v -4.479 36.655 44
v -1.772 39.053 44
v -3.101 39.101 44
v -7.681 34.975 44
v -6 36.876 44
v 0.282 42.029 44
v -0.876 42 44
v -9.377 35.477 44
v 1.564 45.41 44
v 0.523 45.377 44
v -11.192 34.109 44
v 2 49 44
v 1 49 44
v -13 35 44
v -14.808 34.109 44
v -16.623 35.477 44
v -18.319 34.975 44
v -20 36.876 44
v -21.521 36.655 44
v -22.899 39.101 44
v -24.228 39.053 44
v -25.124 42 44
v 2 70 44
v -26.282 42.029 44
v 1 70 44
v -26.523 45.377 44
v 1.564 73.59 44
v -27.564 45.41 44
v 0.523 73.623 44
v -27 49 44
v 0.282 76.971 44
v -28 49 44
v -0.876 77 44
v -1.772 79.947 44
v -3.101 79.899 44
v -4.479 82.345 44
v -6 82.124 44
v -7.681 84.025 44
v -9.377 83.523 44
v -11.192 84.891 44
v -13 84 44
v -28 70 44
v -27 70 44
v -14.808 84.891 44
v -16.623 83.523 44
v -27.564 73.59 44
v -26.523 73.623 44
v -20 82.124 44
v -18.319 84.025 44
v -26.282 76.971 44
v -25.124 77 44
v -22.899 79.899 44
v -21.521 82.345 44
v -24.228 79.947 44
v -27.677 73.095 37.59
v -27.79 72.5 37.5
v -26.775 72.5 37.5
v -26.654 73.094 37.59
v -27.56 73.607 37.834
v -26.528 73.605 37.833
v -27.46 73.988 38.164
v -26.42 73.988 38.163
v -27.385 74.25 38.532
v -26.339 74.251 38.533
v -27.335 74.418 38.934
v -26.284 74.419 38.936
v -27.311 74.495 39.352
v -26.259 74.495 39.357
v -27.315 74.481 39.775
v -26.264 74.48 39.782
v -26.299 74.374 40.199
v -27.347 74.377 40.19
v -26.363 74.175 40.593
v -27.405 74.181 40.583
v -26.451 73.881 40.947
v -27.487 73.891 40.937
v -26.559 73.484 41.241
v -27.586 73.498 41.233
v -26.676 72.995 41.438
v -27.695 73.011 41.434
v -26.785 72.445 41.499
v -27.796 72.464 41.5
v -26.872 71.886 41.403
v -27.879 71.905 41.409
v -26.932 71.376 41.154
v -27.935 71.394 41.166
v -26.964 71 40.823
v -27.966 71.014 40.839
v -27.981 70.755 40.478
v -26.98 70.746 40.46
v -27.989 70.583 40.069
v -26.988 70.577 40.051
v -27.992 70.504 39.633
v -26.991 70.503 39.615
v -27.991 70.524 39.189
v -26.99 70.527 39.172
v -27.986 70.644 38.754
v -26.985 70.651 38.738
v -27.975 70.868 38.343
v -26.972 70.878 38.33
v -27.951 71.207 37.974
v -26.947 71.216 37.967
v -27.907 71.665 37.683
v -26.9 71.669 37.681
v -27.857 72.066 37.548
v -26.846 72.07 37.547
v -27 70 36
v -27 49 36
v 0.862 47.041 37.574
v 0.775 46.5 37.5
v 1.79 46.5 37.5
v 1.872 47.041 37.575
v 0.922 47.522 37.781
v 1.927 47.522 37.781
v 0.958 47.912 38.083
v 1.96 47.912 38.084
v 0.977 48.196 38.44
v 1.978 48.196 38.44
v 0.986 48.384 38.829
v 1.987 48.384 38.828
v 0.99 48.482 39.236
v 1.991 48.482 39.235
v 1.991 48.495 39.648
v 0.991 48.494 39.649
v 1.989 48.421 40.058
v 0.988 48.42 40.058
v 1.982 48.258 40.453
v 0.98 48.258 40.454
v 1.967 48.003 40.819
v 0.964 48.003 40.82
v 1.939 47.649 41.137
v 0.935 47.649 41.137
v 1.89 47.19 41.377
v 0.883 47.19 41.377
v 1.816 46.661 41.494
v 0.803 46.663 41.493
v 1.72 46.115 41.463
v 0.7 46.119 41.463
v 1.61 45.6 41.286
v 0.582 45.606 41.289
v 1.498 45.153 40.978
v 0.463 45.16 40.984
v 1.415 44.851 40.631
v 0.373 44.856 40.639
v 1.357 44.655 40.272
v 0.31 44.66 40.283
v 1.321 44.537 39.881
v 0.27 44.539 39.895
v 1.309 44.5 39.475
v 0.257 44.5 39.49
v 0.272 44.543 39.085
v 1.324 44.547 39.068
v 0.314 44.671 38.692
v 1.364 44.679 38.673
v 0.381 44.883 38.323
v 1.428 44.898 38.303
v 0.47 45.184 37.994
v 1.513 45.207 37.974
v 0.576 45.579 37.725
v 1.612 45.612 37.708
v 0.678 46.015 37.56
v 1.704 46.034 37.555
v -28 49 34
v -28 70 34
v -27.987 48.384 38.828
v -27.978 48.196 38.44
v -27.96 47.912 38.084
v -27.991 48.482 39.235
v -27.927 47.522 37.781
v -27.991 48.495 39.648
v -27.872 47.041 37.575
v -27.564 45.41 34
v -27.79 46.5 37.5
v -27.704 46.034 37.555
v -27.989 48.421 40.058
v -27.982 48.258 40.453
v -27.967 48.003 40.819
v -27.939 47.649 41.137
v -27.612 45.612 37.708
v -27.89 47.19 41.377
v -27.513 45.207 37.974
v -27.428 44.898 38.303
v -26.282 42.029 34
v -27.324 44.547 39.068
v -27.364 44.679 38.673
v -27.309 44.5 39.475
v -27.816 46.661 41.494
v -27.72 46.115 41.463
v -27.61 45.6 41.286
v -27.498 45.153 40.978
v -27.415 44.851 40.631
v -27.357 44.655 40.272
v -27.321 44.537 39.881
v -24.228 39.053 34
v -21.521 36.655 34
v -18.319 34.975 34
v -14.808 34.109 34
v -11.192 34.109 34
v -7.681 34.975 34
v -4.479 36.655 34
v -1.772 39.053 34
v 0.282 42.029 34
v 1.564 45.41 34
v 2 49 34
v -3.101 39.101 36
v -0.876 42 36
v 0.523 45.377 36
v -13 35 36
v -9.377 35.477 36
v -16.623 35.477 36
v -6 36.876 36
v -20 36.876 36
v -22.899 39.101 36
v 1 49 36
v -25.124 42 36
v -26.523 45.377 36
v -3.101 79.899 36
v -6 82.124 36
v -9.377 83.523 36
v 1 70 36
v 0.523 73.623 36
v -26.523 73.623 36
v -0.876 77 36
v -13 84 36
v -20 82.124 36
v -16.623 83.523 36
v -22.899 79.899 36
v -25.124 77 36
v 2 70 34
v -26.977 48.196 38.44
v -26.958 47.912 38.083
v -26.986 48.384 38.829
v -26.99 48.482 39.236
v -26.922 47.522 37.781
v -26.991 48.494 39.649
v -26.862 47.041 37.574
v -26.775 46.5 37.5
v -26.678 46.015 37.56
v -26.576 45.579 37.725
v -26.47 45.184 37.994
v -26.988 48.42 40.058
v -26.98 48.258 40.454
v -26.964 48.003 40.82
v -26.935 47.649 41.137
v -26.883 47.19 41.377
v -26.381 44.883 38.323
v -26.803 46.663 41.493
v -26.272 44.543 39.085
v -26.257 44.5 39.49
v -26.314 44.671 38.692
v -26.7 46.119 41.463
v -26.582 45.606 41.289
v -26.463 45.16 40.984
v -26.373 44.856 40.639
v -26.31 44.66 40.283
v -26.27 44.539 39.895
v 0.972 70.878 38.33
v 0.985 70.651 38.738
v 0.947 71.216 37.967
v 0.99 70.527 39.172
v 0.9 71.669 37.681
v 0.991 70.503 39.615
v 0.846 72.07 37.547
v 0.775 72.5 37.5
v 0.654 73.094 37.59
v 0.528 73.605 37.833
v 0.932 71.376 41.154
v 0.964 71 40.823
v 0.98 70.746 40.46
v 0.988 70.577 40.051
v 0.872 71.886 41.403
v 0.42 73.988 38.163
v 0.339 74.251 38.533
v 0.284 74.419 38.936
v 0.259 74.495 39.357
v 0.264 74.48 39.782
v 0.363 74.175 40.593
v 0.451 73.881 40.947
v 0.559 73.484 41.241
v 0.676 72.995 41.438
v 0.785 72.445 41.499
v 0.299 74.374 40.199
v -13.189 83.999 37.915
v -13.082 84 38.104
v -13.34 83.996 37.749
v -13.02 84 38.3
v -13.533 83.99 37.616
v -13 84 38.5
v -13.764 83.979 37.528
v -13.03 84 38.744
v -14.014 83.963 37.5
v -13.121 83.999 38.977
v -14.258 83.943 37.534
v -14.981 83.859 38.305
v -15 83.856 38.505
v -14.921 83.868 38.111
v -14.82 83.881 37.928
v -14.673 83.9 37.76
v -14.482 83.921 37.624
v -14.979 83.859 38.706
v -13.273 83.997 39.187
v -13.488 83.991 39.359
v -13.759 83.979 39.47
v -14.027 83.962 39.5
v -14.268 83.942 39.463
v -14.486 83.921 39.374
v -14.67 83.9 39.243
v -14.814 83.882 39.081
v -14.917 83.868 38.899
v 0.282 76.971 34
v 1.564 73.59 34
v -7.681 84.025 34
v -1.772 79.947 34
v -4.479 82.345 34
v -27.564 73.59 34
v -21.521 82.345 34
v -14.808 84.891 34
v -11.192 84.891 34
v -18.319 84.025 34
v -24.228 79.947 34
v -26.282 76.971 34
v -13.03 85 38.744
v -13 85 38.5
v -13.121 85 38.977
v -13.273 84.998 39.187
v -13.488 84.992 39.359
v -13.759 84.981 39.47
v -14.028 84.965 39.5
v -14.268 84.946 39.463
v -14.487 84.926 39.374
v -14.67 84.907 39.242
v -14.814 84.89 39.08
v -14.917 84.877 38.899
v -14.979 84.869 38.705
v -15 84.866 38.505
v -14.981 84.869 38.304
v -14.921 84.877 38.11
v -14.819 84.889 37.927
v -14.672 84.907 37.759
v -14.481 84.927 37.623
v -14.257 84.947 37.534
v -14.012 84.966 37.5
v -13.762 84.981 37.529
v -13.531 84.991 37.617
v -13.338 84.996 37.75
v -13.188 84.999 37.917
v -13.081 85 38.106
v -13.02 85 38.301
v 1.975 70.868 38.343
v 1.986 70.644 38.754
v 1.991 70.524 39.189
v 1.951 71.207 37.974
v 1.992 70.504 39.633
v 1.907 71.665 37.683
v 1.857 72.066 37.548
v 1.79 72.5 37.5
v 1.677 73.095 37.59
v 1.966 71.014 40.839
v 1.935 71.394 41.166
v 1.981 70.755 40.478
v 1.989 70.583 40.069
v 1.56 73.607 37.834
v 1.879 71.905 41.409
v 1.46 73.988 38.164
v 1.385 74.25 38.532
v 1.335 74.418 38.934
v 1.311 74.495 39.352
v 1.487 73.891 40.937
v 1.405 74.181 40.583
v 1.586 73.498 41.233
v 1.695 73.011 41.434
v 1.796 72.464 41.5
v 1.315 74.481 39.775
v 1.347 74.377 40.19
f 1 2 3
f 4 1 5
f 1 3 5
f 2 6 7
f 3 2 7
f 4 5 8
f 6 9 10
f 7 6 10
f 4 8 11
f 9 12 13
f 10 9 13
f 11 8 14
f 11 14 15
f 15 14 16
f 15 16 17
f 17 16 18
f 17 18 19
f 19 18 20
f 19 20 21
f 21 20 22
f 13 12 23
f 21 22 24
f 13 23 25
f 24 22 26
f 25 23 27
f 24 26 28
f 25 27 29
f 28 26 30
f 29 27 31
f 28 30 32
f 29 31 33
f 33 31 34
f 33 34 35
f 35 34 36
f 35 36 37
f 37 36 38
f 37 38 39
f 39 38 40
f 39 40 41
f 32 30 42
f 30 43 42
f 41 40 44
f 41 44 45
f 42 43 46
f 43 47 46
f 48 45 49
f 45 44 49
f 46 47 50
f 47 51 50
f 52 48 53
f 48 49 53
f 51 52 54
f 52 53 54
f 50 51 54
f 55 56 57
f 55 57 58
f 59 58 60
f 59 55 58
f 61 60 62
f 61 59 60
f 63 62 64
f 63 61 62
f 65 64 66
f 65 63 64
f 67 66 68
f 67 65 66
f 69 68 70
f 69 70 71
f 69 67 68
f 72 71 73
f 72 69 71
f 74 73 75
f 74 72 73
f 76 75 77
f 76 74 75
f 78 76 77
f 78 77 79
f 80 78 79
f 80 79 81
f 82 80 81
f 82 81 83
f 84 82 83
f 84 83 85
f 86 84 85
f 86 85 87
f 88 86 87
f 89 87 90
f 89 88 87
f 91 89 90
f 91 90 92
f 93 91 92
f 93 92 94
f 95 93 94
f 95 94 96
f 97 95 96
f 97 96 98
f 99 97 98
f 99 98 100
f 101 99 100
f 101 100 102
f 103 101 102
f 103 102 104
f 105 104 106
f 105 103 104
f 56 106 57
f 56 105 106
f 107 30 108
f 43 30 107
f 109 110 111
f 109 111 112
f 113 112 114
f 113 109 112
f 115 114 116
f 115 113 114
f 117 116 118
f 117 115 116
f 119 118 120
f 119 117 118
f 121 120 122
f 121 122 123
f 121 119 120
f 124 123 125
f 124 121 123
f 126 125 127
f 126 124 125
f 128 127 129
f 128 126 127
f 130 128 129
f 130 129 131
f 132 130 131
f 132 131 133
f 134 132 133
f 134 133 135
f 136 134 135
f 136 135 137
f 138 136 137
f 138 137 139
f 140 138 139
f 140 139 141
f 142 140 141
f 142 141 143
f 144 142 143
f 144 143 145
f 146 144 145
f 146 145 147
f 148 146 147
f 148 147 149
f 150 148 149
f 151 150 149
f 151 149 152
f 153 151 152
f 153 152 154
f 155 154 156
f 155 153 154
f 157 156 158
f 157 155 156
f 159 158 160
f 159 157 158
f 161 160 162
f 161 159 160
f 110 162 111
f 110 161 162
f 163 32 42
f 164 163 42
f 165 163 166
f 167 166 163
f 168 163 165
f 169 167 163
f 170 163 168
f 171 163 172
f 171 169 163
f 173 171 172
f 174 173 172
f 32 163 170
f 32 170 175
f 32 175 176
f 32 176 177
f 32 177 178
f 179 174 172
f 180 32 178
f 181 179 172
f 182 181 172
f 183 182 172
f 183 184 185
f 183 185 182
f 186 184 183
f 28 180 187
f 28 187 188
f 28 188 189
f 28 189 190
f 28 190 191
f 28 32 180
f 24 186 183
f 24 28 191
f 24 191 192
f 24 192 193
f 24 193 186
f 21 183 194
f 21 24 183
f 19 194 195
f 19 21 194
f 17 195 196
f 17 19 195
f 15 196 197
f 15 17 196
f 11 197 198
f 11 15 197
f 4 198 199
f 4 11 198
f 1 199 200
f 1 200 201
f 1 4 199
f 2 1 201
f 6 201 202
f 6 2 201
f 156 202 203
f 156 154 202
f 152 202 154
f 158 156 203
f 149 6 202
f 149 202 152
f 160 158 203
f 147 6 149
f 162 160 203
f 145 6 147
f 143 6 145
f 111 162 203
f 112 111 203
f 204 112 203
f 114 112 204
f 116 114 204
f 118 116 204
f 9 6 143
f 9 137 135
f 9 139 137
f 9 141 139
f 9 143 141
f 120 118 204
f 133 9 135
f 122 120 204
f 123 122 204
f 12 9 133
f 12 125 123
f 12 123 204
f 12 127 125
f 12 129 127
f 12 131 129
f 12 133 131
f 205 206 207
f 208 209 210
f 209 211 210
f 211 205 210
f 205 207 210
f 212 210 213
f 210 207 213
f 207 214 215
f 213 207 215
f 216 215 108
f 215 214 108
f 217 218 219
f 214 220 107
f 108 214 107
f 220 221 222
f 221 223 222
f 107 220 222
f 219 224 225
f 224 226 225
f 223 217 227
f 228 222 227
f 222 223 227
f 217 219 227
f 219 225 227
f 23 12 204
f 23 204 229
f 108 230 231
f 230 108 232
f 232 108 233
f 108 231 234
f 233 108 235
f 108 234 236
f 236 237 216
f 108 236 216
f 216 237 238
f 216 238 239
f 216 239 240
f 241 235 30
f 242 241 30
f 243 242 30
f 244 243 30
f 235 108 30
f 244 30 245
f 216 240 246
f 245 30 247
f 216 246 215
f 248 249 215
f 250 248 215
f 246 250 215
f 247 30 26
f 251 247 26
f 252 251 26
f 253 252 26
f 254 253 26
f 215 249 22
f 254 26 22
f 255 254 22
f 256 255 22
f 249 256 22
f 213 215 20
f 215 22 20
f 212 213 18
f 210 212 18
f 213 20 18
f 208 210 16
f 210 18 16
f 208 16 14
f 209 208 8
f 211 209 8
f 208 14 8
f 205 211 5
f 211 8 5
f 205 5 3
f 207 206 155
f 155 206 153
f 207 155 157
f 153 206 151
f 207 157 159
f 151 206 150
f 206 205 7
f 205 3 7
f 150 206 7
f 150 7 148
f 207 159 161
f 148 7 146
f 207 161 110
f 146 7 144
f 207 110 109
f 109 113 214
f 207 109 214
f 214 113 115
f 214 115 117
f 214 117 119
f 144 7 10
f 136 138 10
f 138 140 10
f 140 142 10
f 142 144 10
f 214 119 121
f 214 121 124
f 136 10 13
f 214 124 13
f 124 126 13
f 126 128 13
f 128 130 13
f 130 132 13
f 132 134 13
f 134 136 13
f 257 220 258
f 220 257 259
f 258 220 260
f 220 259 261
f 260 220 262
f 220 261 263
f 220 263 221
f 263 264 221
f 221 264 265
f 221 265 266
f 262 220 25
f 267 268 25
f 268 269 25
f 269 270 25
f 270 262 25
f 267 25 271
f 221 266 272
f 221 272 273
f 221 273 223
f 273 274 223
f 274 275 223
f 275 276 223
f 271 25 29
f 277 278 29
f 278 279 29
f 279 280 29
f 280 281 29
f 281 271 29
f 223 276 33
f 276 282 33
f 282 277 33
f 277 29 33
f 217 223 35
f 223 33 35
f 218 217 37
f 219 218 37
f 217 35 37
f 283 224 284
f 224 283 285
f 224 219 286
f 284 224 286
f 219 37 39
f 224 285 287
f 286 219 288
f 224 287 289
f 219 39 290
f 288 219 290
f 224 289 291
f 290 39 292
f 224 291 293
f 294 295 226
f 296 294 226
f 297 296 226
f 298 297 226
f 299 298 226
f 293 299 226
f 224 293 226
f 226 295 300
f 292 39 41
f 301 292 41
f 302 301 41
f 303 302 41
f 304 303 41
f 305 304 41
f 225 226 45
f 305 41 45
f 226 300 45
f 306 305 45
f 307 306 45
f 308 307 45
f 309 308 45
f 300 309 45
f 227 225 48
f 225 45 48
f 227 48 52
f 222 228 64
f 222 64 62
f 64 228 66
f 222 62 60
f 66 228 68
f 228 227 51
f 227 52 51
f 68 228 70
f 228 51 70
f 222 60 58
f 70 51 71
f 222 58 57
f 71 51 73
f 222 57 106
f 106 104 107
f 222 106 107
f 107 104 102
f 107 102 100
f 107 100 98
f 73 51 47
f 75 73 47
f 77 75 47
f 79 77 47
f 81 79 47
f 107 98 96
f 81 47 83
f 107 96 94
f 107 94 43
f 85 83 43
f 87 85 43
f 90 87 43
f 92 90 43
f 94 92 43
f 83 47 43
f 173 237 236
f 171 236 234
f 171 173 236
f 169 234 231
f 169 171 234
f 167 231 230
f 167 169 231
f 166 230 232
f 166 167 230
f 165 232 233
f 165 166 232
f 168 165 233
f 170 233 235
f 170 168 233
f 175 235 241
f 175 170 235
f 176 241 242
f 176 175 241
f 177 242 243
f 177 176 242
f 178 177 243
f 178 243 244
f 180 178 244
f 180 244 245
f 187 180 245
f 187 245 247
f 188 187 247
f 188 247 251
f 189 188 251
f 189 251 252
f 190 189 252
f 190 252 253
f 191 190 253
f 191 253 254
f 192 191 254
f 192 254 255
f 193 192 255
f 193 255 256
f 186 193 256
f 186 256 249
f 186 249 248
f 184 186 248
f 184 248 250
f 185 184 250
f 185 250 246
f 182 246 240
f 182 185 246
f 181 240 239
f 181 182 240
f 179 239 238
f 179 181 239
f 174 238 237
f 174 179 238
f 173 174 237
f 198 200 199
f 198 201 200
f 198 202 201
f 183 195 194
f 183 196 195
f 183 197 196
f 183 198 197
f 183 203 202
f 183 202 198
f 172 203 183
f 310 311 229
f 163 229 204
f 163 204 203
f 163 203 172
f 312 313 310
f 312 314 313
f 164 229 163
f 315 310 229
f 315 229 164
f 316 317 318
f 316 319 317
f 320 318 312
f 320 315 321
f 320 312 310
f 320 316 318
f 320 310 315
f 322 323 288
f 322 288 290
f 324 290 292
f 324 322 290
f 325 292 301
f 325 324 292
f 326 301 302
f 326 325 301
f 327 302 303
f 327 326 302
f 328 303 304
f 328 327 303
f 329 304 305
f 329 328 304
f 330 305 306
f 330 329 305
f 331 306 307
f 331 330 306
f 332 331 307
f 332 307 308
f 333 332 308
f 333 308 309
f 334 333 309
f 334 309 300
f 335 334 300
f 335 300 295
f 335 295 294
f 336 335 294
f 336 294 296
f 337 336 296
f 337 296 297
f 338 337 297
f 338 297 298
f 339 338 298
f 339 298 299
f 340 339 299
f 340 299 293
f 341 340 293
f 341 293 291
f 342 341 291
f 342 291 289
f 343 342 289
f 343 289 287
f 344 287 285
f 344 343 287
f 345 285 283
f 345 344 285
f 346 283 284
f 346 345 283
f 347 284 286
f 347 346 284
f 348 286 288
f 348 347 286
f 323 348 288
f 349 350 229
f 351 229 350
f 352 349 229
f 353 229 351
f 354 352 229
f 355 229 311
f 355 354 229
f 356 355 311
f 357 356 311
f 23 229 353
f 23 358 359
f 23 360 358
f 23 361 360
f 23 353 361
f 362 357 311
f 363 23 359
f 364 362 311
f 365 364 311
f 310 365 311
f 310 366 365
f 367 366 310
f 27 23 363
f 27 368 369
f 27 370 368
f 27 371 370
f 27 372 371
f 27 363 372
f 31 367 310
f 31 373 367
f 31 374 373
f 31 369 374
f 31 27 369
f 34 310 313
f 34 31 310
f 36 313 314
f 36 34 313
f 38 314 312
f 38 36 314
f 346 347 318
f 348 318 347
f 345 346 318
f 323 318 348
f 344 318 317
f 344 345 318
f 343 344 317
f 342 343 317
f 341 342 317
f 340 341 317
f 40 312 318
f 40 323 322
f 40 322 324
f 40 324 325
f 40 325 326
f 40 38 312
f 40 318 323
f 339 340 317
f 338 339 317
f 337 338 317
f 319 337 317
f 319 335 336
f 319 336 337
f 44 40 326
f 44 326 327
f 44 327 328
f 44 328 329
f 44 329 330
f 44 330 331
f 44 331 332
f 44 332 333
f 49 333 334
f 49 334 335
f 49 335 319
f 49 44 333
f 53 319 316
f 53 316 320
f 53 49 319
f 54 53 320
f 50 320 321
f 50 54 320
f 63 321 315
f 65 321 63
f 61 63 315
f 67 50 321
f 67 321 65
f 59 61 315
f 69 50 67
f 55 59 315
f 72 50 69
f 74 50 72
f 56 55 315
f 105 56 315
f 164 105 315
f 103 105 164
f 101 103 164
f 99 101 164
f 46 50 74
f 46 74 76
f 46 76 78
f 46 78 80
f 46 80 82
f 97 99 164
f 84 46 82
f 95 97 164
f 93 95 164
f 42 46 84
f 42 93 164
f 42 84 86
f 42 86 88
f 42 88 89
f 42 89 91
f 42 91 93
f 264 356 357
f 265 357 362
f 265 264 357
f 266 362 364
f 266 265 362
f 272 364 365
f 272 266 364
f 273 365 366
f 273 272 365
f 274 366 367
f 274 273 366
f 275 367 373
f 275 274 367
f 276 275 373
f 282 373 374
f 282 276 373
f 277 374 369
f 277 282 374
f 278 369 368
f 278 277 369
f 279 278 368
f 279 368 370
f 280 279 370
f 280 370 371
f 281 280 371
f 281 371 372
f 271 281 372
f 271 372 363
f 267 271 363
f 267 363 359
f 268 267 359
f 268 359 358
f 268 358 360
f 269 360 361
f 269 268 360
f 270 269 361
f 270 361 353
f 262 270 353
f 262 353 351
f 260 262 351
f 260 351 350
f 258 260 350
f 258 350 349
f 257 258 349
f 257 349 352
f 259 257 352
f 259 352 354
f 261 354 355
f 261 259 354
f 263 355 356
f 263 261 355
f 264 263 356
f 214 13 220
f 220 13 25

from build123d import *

# Parameters (mm, degrees)
CYLINDER017_R           = 1
CYLINDER017_DEPTH       = 10
CYLINDER017_ROLL_ANGLE  = 90
CYLINDER011_R           = 2
CYLINDER011_DEPTH       = 10
CYLINDER011_PITCH_ANGLE = 90
CYLINDER014_R           = 2
CYLINDER014_DEPTH       = 10
CYLINDER014_PITCH_ANGLE = 90
CYLINDER013_R           = 2
CYLINDER013_DEPTH       = 10
CYLINDER013_PITCH_ANGLE = 90
CYLINDER015_R           = 2
CYLINDER015_DEPTH       = 10
CYLINDER015_PITCH_ANGLE = 90
CYLINDER002_W           = 14
CYLINDER002_H           = 8
CYLINDER002_ANGLE       = 180
CYLINDER001_W           = 15
CYLINDER001_H           = 10
CYLINDER001_ANGLE       = 180
CYLINDER003_W           = 14
CYLINDER003_H           = 8
CYLINDER003_ANGLE       = 180
CYLINDER_W              = 15
CYLINDER_H              = 10
CYLINDER_ANGLE          = 180
BOX001_W                = 28
BOX001_H                = 21
BOX001_DEPTH            = 8
BOX_W                   = 30
BOX_H                   = 21
BOX_DEPTH               = 10
FUSION_PLACEMENT_ANGLE  = 180


with BuildPart() as cilindro017:
    # Cylinder017 → Cylinder017 (new body)
    with BuildSketch(Plane.XY):
        Circle(CYLINDER017_R)
    extrude(amount=CYLINDER017_DEPTH)


with BuildPart() as cilindro017_1:
    # Cylinder017 roll: moved
    add(cilindro017.part.rotate(Axis((0, 0, 0), (1, 0, 0)), CYLINDER017_ROLL_ANGLE))


with BuildPart() as cilindro017_2:
    # Cylinder017 placement: moved
    add(cilindro017_1.part.moved(Location((-14, 90, 38.5))))


with BuildPart() as cilindro011:
    # Cylinder011 → Cylinder011 (new body)
    with BuildSketch(Plane.XY):
        Circle(CYLINDER011_R)
    extrude(amount=CYLINDER011_DEPTH)


with BuildPart() as cilindro011_1:
    # Cylinder011 pitch: moved
    add(cilindro011.part.rotate(Axis((0, 0, 0), (0, 1, 0)), CYLINDER011_PITCH_ANGLE))


with BuildPart() as cilindro011_2:
    # Cylinder011 placement: moved
    add(cilindro011_1.part.moved(Location((-32, 72.5, 39.5))))


with BuildPart() as cilindro014:
    # Cylinder014 → Cylinder014 (new body)
    with BuildSketch(Plane.XY):
        Circle(CYLINDER014_R)
    extrude(amount=CYLINDER014_DEPTH)


with BuildPart() as cilindro014_1:
    # Cylinder014 pitch: moved
    add(cilindro014.part.rotate(Axis((0, 0, 0), (0, 1, 0)), CYLINDER014_PITCH_ANGLE))


with BuildPart() as cilindro014_2:
    # Cylinder014 placement: moved
    add(cilindro014_1.part.moved(Location((-6, 46.5, 39.5))))


with BuildPart() as cilindro013:
    # Cylinder013 → Cylinder013 (new body)
    with BuildSketch(Plane.XY):
        Circle(CYLINDER013_R)
    extrude(amount=CYLINDER013_DEPTH)


with BuildPart() as cilindro013_1:
    # Cylinder013 pitch: moved
    add(cilindro013.part.rotate(Axis((0, 0, 0), (0, 1, 0)), CYLINDER013_PITCH_ANGLE))


with BuildPart() as cilindro013_2:
    # Cylinder013 placement: moved
    add(cilindro013_1.part.moved(Location((-32, 46.5, 39.5))))


with BuildPart() as cilindro015:
    # Cylinder015 → Cylinder015 (new body)
    with BuildSketch(Plane.XY):
        Circle(CYLINDER015_R)
    extrude(amount=CYLINDER015_DEPTH)


with BuildPart() as cilindro015_1:
    # Cylinder015 pitch: moved
    add(cilindro015.part.rotate(Axis((0, 0, 0), (0, 1, 0)), CYLINDER015_PITCH_ANGLE))


with BuildPart() as cilindro015_2:
    # Cylinder015 placement: moved
    add(cilindro015_1.part.moved(Location((-5, 72.5, 39.5))))


with BuildPart() as cilindro002:
    # Cylinder002 → Cylinder002 (revolve)
    with BuildSketch(Plane(origin=(16, 49, -36), x_dir=(1, 0, 0), z_dir=(0, 1, 0))):
        with Locations((7, 4)):
            Rectangle(CYLINDER002_W, CYLINDER002_H)
    revolve(axis=Axis((16, 49, -36), (0, 0, -1)), revolution_arc=CYLINDER002_ANGLE)


with BuildPart() as cut001:
    # Cylinder001 → Cylinder001 (revolve)
    with BuildSketch(Plane(origin=(16, 49, -34), x_dir=(1, 0, 0), z_dir=(0, 1, 0))):
        with Locations((7.5, 5)):
            Rectangle(CYLINDER001_W, CYLINDER001_H)
    revolve(axis=Axis((16, 49, -34), (0, 0, -1)), revolution_arc=CYLINDER001_ANGLE)

    # Cut001: cut Cilindro002
    add(cilindro002.part, mode=Mode.SUBTRACT)


with BuildPart() as cut001_1:
    # Cut001 placement: moved
    add(cut001.part.moved(Location((-3, 0, 0))))


with BuildPart() as cilindro003:
    # Cylinder003 → Cylinder003 (revolve)
    with BuildSketch(Plane(origin=(13, 70, -36), x_dir=(-1, 0, 0), z_dir=(0, -1, 0))):
        with Locations((7, 4)):
            Rectangle(CYLINDER003_W, CYLINDER003_H)
    revolve(axis=Axis((13, 70, -36), (0, 0, -1)), revolution_arc=CYLINDER003_ANGLE)


with BuildPart() as cut002:
    # Cylinder → Cylinder (revolve)
    with BuildSketch(Plane(origin=(13, 70, -34), x_dir=(-1, 0, 0), z_dir=(0, -1, 0))):
        with Locations((7.5, 5)):
            Rectangle(CYLINDER_W, CYLINDER_H)
    revolve(axis=Axis((13, 70, -34), (0, 0, -1)), revolution_arc=CYLINDER_ANGLE)

    # Cut002: cut Cilindro003
    add(cilindro003.part, mode=Mode.SUBTRACT)


with BuildPart() as cubo001:
    # Box001 → Box001 (new body)
    with BuildSketch(Plane(origin=(-1, 49, -44), x_dir=(1, 0, 0), z_dir=(0, 0, 1))):
        with Locations((14, 10.5)):
            Rectangle(BOX001_W, BOX001_H)
    extrude(amount=BOX001_DEPTH)


with BuildPart() as cut025:
    # Box → Box (new body)
    with BuildSketch(Plane(origin=(-2, 49, -44), x_dir=(1, 0, 0), z_dir=(0, 0, 1))):
        with Locations((15, 10.5)):
            Rectangle(BOX_W, BOX_H)
    extrude(amount=BOX_DEPTH)

    # Cut: cut Cubo001
    add(cubo001.part, mode=Mode.SUBTRACT)

    # Fusion: union Cut001, Cut002
    add(cut001_1.part)
    add(cut002.part)


with BuildPart() as cut025_1:
    # Fusion placement: moved
    add(cut025.part.rotate(Axis((0, 0, 0), (0, 1, 0)), FUSION_PLACEMENT_ANGLE))

    # Cut021: cut Cilindro015
    add(cilindro015_2.part, mode=Mode.SUBTRACT)

    # Cut022: cut Cilindro013
    add(cilindro013_2.part, mode=Mode.SUBTRACT)

    # Cut023: cut Cilindro014
    add(cilindro014_2.part, mode=Mode.SUBTRACT)

    # Cut024: cut Cilindro011
    add(cilindro011_2.part, mode=Mode.SUBTRACT)

    # Cut025: cut Cilindro017
    add(cilindro017_2.part, mode=Mode.SUBTRACT)


solid = cut025_1.part
